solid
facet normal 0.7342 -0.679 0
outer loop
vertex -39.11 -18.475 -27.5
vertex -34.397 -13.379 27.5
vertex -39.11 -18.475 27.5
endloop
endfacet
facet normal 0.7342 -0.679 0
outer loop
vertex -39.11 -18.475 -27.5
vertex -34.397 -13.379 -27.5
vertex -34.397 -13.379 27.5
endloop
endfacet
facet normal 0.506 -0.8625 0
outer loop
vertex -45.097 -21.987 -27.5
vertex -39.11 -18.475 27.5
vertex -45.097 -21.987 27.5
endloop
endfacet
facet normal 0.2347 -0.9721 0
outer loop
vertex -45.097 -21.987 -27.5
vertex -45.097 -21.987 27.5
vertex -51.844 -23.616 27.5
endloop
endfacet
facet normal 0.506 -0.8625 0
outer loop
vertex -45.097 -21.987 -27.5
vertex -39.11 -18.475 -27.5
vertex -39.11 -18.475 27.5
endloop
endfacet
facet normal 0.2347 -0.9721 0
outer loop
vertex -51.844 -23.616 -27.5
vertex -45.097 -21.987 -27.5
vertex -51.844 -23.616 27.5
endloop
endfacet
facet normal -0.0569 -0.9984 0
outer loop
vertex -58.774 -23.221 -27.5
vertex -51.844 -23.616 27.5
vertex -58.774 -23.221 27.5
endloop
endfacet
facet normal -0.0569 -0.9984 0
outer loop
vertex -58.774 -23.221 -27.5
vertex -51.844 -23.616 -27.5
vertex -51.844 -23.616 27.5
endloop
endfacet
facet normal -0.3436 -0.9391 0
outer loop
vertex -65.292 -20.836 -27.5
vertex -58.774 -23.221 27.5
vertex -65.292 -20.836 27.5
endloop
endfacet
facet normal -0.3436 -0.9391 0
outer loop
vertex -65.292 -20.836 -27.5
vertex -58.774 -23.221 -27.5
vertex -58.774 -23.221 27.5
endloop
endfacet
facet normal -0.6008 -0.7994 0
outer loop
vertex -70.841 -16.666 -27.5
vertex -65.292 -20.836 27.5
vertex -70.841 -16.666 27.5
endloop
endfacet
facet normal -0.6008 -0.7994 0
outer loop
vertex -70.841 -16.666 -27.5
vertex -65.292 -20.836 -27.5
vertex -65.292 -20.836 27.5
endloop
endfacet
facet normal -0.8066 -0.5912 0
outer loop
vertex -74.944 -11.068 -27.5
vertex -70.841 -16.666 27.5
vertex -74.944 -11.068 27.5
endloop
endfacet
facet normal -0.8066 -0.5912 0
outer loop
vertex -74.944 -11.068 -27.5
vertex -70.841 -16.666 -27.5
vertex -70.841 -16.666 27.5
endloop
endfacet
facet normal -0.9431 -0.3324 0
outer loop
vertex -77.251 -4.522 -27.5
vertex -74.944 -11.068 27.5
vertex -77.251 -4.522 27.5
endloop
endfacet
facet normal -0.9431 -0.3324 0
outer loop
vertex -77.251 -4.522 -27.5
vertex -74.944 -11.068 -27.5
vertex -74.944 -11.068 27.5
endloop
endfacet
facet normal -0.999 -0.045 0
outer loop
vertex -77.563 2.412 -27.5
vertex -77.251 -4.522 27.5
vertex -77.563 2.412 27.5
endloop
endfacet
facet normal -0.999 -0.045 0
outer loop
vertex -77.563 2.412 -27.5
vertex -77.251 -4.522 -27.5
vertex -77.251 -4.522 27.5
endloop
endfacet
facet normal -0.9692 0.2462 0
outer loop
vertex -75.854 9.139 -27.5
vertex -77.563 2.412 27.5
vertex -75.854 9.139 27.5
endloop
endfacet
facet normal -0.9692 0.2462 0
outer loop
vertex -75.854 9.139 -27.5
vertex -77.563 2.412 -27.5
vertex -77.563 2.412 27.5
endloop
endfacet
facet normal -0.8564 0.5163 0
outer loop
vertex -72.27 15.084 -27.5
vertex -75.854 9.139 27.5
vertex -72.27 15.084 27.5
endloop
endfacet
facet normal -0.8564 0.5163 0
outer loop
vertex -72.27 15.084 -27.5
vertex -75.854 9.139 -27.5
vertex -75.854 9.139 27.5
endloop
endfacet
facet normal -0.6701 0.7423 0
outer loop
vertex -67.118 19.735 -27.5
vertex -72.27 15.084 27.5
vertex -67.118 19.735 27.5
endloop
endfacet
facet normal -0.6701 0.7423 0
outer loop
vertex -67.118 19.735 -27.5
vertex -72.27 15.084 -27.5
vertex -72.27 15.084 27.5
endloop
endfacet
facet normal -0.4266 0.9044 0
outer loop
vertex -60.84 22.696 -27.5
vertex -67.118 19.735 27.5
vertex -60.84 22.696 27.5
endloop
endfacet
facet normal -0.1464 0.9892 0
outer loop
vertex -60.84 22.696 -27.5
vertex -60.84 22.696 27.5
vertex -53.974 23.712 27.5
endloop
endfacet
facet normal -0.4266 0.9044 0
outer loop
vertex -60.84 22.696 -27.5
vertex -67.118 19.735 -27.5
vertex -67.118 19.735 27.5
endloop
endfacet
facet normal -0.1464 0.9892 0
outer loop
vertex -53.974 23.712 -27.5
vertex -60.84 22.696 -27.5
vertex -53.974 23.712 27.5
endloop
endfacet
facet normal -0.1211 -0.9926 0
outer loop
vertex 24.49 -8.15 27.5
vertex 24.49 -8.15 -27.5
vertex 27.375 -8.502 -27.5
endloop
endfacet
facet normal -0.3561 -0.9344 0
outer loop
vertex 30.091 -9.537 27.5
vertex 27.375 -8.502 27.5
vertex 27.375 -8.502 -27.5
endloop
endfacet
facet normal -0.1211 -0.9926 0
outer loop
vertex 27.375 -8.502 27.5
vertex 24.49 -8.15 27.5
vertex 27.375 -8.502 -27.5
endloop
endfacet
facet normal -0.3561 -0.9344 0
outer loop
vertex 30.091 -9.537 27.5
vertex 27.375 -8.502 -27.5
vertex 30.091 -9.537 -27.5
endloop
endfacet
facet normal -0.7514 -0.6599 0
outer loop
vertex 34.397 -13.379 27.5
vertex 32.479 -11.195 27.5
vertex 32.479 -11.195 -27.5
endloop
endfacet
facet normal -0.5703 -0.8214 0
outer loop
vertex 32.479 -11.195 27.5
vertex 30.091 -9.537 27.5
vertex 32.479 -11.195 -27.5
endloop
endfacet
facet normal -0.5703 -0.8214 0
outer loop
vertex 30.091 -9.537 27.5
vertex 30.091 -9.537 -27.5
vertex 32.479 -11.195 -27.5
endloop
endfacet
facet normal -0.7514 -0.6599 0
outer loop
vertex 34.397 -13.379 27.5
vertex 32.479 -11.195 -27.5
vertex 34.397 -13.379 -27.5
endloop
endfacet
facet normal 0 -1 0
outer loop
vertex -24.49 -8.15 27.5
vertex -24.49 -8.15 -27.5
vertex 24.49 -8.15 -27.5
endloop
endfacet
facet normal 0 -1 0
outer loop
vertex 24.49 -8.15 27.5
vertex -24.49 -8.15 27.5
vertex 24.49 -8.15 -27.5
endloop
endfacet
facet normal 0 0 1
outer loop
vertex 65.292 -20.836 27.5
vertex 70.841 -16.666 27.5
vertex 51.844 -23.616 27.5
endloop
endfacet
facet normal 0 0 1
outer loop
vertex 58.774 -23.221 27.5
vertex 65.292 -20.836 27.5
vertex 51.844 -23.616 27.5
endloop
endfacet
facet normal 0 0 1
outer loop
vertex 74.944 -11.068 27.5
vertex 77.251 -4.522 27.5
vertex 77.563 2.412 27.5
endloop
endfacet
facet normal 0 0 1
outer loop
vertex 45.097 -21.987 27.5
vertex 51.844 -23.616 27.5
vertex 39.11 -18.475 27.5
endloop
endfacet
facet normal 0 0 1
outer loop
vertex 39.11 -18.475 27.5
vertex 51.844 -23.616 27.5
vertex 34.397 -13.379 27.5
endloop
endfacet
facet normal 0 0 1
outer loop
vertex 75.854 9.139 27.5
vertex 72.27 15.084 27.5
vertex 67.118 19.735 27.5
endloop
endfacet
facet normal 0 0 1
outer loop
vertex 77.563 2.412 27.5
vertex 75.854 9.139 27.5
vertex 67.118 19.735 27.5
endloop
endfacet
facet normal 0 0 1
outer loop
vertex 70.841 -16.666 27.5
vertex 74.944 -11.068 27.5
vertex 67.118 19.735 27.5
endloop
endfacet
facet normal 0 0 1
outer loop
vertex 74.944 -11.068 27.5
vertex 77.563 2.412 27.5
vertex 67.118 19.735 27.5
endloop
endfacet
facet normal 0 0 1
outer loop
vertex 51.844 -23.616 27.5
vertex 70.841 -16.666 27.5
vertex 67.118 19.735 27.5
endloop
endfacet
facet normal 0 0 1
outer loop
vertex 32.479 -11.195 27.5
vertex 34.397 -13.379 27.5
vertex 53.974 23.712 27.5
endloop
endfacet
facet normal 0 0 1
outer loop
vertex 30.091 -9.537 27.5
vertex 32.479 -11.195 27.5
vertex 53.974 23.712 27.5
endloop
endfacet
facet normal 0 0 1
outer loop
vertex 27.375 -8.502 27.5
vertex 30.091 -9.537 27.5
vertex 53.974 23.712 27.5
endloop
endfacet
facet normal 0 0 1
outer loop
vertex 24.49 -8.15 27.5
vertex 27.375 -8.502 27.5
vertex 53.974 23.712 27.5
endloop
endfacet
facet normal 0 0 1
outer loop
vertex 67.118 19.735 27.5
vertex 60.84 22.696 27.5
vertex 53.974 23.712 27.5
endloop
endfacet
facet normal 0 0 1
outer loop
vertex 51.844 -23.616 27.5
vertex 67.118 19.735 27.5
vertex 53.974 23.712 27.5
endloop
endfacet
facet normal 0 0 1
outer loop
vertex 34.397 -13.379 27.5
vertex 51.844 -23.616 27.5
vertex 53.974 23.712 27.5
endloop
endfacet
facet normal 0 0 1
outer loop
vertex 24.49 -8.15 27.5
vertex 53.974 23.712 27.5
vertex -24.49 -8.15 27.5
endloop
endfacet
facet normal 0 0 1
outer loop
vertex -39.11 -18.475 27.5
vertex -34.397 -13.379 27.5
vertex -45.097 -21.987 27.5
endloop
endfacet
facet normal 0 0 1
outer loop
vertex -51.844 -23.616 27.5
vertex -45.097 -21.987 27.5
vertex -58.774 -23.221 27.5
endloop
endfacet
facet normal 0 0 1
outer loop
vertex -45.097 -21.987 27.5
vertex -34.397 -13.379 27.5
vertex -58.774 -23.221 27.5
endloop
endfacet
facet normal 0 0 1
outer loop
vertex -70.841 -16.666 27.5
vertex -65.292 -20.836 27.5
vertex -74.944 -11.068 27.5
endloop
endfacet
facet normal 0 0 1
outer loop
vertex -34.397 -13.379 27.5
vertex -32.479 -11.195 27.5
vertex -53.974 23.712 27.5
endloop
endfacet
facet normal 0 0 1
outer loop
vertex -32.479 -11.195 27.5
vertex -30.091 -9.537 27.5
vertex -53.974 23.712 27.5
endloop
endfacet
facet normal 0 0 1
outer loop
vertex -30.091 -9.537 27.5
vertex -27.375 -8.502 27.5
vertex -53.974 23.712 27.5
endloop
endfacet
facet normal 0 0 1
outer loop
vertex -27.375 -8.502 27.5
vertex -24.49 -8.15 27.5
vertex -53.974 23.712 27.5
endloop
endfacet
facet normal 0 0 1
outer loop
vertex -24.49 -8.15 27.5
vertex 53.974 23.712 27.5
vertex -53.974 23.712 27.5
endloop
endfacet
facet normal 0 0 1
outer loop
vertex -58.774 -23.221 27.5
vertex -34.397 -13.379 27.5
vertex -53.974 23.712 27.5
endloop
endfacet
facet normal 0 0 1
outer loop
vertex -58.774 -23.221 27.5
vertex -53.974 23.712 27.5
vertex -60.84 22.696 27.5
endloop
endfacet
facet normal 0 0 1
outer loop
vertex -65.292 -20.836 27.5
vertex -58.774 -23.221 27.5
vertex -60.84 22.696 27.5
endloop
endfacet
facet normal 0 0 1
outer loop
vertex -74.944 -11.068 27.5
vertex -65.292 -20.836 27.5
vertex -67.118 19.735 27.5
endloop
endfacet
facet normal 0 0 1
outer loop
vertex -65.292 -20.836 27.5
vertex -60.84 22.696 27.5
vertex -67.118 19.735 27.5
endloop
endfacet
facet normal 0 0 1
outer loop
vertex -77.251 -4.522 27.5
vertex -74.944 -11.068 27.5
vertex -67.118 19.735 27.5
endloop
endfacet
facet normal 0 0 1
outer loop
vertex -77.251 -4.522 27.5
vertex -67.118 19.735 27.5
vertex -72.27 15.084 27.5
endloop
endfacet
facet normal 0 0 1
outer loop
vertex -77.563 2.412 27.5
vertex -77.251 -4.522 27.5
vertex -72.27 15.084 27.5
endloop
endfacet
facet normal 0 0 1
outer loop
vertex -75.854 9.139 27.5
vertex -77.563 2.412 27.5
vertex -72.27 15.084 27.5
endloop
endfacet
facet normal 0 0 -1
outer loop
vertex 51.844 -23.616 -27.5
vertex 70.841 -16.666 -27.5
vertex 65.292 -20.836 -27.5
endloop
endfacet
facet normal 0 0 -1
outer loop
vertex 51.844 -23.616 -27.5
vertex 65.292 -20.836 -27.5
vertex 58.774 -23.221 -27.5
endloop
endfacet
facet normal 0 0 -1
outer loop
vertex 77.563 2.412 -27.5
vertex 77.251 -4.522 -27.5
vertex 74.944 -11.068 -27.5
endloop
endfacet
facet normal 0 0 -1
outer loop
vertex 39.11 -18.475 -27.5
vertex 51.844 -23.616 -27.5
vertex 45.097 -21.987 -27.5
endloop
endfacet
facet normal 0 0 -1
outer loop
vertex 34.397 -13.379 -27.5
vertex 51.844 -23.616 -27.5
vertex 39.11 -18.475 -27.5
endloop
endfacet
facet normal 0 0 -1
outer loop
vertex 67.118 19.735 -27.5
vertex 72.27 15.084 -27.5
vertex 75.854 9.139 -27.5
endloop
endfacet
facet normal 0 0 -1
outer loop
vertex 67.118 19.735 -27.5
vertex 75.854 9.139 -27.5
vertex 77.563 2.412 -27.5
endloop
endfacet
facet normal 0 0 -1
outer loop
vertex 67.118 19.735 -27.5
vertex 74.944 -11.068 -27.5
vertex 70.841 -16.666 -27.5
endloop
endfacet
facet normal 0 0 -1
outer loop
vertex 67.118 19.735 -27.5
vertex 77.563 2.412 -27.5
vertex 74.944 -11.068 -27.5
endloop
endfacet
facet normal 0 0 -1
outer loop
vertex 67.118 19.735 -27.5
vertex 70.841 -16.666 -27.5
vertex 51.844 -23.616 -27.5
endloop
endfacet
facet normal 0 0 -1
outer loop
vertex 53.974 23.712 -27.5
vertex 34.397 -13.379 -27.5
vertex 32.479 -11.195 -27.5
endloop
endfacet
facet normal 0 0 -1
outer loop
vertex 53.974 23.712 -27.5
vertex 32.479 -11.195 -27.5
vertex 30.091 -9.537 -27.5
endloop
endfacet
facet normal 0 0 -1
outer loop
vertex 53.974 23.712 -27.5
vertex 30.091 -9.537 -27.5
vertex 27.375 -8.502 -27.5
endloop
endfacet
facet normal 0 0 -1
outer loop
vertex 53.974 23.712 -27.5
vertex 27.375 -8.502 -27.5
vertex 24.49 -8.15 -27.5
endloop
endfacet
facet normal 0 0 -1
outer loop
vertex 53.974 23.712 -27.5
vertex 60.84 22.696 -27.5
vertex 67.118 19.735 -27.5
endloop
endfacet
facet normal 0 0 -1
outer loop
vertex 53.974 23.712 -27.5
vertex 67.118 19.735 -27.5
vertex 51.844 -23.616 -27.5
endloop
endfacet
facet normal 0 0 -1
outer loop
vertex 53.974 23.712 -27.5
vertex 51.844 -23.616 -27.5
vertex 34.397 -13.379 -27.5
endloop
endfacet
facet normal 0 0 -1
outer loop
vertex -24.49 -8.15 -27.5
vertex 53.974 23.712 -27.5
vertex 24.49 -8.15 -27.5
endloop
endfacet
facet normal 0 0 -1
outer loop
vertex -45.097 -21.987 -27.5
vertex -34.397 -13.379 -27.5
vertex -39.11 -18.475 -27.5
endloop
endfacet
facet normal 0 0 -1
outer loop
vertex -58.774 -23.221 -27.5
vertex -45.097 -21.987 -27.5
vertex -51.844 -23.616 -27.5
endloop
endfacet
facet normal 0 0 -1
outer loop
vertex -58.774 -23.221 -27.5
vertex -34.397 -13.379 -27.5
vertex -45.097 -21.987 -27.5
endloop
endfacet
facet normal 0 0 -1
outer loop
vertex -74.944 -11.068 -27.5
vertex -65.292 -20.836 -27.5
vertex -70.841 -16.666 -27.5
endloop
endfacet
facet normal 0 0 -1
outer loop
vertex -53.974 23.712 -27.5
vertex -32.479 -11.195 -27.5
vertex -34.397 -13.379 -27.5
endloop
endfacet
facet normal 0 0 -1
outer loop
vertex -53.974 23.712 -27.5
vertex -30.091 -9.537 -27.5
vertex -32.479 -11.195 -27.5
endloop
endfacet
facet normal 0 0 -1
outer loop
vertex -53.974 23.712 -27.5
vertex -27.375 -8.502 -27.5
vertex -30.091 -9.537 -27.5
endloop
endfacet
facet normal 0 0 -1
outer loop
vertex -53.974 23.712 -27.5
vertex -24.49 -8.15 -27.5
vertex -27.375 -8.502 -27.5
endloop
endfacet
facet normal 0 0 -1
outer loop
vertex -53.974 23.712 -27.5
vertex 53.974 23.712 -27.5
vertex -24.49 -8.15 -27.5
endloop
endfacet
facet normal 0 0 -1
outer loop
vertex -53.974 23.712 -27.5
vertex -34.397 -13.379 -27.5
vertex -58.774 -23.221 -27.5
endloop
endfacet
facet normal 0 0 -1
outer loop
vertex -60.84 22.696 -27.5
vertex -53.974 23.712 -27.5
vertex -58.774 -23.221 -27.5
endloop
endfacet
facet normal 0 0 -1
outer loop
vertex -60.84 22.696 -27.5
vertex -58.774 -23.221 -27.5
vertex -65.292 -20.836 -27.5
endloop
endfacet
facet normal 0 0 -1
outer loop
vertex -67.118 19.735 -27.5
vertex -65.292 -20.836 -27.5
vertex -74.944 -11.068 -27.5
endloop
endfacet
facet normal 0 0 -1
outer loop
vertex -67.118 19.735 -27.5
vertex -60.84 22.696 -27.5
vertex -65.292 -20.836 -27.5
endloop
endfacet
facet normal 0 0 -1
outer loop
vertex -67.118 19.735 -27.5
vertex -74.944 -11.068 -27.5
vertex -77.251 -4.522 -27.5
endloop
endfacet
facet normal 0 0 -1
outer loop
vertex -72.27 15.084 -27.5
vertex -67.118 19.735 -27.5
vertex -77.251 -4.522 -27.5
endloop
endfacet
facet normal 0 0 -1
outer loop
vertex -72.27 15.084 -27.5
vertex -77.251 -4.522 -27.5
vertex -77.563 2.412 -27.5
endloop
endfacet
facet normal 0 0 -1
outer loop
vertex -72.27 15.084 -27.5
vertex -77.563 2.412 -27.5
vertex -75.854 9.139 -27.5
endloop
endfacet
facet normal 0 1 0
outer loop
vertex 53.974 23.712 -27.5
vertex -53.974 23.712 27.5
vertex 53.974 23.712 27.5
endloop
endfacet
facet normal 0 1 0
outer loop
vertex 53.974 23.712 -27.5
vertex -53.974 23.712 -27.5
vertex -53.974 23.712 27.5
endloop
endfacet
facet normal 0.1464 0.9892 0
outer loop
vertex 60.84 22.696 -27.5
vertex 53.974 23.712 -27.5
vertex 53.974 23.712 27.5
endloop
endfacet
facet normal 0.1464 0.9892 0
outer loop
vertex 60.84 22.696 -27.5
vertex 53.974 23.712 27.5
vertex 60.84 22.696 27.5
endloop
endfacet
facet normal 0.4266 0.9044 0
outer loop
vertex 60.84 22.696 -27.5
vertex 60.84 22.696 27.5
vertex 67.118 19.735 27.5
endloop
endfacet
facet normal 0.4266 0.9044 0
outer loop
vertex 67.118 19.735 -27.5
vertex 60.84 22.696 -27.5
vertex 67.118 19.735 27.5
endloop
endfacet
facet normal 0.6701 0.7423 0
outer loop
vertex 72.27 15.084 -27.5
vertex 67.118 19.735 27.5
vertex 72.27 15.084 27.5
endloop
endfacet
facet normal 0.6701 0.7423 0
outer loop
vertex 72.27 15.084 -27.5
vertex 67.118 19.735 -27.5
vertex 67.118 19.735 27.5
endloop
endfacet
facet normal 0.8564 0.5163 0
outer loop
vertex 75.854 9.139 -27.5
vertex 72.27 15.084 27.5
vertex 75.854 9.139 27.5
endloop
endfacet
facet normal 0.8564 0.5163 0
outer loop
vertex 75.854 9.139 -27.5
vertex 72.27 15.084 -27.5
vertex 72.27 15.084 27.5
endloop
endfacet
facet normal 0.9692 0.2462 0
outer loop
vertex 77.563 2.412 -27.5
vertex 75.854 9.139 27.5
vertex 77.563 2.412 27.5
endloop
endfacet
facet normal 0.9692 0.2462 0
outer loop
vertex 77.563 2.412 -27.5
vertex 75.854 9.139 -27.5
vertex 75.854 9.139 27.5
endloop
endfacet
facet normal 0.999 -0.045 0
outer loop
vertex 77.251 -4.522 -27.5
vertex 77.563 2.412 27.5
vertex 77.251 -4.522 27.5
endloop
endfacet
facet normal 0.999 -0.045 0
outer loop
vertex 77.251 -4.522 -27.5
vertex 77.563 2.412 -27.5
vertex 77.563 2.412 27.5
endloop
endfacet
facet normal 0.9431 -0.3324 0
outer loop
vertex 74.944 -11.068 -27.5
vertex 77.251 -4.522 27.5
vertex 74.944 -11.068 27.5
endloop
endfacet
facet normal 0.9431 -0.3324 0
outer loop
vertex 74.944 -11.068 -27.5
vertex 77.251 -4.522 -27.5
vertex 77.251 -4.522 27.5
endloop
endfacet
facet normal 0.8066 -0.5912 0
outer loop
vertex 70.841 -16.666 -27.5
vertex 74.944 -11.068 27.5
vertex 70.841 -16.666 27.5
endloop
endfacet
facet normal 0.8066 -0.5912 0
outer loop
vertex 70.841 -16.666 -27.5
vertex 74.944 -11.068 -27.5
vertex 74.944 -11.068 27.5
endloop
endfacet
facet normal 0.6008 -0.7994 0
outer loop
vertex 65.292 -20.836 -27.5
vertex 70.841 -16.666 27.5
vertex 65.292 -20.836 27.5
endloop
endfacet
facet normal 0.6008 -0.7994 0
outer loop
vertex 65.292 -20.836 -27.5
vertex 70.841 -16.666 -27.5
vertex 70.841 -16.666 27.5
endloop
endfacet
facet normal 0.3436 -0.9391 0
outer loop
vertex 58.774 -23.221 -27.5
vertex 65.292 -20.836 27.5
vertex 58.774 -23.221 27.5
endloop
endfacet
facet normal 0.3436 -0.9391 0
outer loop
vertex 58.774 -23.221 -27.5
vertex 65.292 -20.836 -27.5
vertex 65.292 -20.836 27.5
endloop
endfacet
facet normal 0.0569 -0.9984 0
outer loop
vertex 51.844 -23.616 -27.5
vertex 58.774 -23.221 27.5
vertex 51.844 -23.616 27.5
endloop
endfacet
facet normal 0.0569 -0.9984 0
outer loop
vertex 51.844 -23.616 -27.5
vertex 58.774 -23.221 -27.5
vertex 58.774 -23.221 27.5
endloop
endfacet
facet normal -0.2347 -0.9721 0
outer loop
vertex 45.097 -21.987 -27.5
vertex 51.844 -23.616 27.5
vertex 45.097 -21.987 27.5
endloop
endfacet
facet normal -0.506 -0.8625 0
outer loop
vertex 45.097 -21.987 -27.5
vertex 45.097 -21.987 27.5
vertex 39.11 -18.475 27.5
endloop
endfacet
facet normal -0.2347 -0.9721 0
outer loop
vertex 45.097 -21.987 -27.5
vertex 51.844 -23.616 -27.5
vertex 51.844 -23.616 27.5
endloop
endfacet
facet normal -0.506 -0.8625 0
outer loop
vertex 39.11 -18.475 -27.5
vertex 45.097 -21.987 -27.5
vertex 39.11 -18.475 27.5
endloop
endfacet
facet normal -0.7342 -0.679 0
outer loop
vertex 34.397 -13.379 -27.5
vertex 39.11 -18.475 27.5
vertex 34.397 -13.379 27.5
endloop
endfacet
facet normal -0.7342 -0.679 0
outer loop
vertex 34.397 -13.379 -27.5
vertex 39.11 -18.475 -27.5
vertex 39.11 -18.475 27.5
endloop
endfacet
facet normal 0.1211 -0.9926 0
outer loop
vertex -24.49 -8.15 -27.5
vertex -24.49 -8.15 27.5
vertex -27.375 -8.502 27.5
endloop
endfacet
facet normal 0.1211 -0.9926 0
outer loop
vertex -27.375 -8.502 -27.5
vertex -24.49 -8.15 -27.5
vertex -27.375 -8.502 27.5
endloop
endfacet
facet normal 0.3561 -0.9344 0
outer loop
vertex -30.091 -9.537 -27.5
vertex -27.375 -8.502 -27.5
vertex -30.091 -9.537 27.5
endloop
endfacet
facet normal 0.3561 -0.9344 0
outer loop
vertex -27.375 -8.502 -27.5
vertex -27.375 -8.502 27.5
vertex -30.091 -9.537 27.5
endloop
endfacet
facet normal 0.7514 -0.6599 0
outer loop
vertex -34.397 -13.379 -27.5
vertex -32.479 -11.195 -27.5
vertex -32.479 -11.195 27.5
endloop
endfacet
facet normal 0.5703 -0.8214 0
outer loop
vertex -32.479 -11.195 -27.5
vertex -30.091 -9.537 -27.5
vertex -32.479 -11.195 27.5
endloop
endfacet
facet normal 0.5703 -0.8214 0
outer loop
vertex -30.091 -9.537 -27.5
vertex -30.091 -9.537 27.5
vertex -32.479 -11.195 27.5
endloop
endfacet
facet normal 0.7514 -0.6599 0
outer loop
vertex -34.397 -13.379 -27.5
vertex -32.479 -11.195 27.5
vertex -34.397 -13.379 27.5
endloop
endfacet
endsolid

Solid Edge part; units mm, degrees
sketch "Sketch1" plane through (0, 0, 0) normal (0, 0, 1) x (1, 0, 0)
  line L0 (-53.9742, 23.7118) -> (53.9742, 23.7118)
  line L1 (-31.7069, -8.1496) -> (31.7069, -8.1496)
  arc A0 (-31.7069, -8.1496) -> (-53.9742, 23.7118) centre (-53.9742, 0) cw
  arc A1 (53.9742, 23.7118) -> (31.7069, -8.1496) centre (53.9742, 0) cw
extrude "Protrusion1" add sketch "Sketch1" along normal mid plane 55
fillet "Round_1" radius 12 2 edges at (-31.7069, -8.1496, 0) (31.7069, -8.1496, 0)
